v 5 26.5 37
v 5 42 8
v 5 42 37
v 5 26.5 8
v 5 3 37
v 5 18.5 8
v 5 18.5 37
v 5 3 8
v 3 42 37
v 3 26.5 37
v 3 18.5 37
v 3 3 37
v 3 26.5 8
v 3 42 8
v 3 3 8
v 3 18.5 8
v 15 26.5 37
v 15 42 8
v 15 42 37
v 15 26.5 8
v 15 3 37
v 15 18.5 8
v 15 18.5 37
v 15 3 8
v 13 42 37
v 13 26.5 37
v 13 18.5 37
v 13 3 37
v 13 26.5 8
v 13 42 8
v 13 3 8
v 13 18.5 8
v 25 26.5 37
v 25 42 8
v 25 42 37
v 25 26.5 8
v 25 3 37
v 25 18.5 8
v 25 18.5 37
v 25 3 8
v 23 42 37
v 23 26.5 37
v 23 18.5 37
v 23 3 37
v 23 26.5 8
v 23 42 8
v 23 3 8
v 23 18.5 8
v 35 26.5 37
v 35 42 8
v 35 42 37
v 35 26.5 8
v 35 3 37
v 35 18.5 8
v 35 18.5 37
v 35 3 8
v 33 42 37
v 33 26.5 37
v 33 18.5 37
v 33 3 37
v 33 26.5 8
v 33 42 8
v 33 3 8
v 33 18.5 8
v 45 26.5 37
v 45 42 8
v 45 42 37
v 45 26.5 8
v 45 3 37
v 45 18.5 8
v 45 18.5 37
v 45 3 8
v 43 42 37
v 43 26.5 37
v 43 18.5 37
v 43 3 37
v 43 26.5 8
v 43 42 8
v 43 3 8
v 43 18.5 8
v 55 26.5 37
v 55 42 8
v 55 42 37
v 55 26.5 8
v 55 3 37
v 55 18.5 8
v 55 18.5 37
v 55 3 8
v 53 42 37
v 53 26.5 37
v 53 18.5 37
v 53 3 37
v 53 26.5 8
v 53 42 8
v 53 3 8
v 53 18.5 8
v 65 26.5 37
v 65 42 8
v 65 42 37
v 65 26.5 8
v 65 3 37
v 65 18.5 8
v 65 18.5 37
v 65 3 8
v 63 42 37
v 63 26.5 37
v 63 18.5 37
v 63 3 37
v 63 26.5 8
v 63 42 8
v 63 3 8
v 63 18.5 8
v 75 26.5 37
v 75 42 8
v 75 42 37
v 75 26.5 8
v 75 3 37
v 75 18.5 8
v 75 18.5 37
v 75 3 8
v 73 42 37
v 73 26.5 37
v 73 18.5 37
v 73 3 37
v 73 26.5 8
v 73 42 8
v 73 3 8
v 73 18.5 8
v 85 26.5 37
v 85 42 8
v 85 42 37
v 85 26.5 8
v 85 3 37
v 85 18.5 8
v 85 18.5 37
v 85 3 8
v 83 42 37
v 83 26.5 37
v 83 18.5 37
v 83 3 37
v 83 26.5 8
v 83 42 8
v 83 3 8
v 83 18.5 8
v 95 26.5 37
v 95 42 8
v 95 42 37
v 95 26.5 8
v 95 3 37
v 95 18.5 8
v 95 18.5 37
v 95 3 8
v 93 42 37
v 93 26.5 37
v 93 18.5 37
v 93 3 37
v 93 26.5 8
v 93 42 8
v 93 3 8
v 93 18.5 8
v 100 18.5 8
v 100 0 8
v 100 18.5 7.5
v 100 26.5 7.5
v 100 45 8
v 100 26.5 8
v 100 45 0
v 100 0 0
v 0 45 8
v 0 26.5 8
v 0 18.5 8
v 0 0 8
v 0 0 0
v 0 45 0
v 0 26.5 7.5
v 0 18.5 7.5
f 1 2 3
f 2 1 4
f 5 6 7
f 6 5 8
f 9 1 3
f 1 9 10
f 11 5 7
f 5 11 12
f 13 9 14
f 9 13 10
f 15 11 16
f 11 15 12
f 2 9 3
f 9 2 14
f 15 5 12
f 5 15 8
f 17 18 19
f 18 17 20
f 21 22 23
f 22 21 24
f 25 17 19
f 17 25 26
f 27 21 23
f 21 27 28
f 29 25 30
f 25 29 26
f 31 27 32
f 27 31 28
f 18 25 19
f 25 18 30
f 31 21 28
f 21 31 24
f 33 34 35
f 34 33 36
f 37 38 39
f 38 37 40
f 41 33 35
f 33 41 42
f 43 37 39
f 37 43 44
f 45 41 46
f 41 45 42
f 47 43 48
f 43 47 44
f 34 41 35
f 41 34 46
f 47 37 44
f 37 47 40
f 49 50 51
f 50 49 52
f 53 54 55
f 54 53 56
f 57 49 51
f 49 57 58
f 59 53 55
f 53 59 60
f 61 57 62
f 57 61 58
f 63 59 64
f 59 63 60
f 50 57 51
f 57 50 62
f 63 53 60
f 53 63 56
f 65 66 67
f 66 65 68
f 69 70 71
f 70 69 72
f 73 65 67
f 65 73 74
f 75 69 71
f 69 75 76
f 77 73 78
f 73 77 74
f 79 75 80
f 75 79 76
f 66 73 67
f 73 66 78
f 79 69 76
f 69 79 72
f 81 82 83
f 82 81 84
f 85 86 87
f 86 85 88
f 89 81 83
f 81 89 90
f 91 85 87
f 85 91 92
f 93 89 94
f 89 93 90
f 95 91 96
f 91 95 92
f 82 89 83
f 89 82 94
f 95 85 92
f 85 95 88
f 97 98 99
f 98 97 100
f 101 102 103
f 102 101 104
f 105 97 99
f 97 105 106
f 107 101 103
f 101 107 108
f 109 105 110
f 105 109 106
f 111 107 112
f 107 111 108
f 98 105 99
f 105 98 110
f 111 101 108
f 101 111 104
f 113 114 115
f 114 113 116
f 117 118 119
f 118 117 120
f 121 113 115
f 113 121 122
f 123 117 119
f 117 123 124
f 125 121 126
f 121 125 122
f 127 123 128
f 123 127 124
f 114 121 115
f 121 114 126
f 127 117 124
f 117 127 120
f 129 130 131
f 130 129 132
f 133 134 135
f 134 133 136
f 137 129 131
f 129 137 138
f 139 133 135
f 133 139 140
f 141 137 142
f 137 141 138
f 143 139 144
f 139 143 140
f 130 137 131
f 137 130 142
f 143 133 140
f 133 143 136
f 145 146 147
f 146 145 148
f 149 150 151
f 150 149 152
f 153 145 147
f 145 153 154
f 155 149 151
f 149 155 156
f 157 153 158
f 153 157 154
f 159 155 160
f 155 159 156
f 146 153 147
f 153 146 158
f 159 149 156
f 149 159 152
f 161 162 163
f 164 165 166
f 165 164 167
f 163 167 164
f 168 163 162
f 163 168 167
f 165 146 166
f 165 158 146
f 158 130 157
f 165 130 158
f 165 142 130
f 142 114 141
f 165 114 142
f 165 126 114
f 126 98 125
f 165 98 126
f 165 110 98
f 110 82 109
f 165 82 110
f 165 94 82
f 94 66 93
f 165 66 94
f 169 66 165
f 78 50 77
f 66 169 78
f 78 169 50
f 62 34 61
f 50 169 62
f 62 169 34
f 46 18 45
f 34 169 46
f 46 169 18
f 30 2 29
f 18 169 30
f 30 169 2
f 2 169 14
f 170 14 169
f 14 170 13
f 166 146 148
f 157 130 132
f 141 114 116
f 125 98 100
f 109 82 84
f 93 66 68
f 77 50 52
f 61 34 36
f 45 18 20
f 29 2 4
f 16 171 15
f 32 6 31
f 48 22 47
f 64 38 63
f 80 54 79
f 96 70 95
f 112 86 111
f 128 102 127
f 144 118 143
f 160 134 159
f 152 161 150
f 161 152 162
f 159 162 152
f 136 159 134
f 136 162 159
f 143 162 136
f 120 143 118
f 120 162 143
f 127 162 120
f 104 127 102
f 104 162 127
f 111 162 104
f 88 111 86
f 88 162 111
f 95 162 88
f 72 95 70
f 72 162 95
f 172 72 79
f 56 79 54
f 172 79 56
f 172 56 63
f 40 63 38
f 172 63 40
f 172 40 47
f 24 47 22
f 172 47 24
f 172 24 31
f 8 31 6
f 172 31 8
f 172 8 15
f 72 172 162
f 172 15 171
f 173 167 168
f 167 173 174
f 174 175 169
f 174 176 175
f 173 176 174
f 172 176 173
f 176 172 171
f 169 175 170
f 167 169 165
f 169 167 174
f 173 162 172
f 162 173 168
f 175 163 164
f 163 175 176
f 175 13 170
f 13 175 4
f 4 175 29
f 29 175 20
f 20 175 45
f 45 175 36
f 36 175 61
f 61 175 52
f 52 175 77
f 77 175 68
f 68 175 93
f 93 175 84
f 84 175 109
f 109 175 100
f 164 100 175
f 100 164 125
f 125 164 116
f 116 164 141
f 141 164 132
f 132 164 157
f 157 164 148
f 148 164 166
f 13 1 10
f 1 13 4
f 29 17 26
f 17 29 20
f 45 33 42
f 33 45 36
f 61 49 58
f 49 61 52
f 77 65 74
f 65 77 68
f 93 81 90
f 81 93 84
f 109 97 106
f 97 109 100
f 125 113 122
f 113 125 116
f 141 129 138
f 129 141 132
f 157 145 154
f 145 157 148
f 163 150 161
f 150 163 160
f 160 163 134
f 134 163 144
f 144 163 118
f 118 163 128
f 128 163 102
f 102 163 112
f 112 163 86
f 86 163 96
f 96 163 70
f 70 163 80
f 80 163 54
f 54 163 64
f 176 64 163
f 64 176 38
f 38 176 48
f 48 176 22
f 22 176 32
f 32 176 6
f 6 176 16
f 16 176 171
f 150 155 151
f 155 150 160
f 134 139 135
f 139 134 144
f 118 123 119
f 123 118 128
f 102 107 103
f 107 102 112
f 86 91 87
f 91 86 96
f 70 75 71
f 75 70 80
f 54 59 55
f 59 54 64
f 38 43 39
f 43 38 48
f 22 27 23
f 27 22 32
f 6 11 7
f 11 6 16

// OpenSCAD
$fn = 32;

// ----------------------------------------------------------------------
// Heatsink: slotted fin block
// ----------------------------------------------------------------------

// --- parameters (mm) ---
base_l = 100;             // base length, X
base_w = 45;              // base width, Y
base_t = 8;               // base plate thickness
fin_h = 30;               // fin height above the base
fin_t = 2;                // fin thickness
edge = 3;                 // margin from the base ends
pitch = 10;               // fin pitch
slot_w = 8;               // central slot width, Y

n_fins = floor((base_l - 2 * edge - fin_t) / pitch) + 1;  // fin count
total_h = base_t + fin_h - 1;  // overall height

difference() {
union() {
  cube([base_l, base_w, base_t]);
  for (i = [0 : n_fins - 1])
    translate([edge + i * pitch, edge, base_t - 1])
      cube([fin_t, base_w - 2 * edge, fin_h]);
}
  translate([-1, base_w / 2 - slot_w / 2, base_t - 0.5])
    cube([base_l + 2, slot_w, fin_h + 2]);
}
